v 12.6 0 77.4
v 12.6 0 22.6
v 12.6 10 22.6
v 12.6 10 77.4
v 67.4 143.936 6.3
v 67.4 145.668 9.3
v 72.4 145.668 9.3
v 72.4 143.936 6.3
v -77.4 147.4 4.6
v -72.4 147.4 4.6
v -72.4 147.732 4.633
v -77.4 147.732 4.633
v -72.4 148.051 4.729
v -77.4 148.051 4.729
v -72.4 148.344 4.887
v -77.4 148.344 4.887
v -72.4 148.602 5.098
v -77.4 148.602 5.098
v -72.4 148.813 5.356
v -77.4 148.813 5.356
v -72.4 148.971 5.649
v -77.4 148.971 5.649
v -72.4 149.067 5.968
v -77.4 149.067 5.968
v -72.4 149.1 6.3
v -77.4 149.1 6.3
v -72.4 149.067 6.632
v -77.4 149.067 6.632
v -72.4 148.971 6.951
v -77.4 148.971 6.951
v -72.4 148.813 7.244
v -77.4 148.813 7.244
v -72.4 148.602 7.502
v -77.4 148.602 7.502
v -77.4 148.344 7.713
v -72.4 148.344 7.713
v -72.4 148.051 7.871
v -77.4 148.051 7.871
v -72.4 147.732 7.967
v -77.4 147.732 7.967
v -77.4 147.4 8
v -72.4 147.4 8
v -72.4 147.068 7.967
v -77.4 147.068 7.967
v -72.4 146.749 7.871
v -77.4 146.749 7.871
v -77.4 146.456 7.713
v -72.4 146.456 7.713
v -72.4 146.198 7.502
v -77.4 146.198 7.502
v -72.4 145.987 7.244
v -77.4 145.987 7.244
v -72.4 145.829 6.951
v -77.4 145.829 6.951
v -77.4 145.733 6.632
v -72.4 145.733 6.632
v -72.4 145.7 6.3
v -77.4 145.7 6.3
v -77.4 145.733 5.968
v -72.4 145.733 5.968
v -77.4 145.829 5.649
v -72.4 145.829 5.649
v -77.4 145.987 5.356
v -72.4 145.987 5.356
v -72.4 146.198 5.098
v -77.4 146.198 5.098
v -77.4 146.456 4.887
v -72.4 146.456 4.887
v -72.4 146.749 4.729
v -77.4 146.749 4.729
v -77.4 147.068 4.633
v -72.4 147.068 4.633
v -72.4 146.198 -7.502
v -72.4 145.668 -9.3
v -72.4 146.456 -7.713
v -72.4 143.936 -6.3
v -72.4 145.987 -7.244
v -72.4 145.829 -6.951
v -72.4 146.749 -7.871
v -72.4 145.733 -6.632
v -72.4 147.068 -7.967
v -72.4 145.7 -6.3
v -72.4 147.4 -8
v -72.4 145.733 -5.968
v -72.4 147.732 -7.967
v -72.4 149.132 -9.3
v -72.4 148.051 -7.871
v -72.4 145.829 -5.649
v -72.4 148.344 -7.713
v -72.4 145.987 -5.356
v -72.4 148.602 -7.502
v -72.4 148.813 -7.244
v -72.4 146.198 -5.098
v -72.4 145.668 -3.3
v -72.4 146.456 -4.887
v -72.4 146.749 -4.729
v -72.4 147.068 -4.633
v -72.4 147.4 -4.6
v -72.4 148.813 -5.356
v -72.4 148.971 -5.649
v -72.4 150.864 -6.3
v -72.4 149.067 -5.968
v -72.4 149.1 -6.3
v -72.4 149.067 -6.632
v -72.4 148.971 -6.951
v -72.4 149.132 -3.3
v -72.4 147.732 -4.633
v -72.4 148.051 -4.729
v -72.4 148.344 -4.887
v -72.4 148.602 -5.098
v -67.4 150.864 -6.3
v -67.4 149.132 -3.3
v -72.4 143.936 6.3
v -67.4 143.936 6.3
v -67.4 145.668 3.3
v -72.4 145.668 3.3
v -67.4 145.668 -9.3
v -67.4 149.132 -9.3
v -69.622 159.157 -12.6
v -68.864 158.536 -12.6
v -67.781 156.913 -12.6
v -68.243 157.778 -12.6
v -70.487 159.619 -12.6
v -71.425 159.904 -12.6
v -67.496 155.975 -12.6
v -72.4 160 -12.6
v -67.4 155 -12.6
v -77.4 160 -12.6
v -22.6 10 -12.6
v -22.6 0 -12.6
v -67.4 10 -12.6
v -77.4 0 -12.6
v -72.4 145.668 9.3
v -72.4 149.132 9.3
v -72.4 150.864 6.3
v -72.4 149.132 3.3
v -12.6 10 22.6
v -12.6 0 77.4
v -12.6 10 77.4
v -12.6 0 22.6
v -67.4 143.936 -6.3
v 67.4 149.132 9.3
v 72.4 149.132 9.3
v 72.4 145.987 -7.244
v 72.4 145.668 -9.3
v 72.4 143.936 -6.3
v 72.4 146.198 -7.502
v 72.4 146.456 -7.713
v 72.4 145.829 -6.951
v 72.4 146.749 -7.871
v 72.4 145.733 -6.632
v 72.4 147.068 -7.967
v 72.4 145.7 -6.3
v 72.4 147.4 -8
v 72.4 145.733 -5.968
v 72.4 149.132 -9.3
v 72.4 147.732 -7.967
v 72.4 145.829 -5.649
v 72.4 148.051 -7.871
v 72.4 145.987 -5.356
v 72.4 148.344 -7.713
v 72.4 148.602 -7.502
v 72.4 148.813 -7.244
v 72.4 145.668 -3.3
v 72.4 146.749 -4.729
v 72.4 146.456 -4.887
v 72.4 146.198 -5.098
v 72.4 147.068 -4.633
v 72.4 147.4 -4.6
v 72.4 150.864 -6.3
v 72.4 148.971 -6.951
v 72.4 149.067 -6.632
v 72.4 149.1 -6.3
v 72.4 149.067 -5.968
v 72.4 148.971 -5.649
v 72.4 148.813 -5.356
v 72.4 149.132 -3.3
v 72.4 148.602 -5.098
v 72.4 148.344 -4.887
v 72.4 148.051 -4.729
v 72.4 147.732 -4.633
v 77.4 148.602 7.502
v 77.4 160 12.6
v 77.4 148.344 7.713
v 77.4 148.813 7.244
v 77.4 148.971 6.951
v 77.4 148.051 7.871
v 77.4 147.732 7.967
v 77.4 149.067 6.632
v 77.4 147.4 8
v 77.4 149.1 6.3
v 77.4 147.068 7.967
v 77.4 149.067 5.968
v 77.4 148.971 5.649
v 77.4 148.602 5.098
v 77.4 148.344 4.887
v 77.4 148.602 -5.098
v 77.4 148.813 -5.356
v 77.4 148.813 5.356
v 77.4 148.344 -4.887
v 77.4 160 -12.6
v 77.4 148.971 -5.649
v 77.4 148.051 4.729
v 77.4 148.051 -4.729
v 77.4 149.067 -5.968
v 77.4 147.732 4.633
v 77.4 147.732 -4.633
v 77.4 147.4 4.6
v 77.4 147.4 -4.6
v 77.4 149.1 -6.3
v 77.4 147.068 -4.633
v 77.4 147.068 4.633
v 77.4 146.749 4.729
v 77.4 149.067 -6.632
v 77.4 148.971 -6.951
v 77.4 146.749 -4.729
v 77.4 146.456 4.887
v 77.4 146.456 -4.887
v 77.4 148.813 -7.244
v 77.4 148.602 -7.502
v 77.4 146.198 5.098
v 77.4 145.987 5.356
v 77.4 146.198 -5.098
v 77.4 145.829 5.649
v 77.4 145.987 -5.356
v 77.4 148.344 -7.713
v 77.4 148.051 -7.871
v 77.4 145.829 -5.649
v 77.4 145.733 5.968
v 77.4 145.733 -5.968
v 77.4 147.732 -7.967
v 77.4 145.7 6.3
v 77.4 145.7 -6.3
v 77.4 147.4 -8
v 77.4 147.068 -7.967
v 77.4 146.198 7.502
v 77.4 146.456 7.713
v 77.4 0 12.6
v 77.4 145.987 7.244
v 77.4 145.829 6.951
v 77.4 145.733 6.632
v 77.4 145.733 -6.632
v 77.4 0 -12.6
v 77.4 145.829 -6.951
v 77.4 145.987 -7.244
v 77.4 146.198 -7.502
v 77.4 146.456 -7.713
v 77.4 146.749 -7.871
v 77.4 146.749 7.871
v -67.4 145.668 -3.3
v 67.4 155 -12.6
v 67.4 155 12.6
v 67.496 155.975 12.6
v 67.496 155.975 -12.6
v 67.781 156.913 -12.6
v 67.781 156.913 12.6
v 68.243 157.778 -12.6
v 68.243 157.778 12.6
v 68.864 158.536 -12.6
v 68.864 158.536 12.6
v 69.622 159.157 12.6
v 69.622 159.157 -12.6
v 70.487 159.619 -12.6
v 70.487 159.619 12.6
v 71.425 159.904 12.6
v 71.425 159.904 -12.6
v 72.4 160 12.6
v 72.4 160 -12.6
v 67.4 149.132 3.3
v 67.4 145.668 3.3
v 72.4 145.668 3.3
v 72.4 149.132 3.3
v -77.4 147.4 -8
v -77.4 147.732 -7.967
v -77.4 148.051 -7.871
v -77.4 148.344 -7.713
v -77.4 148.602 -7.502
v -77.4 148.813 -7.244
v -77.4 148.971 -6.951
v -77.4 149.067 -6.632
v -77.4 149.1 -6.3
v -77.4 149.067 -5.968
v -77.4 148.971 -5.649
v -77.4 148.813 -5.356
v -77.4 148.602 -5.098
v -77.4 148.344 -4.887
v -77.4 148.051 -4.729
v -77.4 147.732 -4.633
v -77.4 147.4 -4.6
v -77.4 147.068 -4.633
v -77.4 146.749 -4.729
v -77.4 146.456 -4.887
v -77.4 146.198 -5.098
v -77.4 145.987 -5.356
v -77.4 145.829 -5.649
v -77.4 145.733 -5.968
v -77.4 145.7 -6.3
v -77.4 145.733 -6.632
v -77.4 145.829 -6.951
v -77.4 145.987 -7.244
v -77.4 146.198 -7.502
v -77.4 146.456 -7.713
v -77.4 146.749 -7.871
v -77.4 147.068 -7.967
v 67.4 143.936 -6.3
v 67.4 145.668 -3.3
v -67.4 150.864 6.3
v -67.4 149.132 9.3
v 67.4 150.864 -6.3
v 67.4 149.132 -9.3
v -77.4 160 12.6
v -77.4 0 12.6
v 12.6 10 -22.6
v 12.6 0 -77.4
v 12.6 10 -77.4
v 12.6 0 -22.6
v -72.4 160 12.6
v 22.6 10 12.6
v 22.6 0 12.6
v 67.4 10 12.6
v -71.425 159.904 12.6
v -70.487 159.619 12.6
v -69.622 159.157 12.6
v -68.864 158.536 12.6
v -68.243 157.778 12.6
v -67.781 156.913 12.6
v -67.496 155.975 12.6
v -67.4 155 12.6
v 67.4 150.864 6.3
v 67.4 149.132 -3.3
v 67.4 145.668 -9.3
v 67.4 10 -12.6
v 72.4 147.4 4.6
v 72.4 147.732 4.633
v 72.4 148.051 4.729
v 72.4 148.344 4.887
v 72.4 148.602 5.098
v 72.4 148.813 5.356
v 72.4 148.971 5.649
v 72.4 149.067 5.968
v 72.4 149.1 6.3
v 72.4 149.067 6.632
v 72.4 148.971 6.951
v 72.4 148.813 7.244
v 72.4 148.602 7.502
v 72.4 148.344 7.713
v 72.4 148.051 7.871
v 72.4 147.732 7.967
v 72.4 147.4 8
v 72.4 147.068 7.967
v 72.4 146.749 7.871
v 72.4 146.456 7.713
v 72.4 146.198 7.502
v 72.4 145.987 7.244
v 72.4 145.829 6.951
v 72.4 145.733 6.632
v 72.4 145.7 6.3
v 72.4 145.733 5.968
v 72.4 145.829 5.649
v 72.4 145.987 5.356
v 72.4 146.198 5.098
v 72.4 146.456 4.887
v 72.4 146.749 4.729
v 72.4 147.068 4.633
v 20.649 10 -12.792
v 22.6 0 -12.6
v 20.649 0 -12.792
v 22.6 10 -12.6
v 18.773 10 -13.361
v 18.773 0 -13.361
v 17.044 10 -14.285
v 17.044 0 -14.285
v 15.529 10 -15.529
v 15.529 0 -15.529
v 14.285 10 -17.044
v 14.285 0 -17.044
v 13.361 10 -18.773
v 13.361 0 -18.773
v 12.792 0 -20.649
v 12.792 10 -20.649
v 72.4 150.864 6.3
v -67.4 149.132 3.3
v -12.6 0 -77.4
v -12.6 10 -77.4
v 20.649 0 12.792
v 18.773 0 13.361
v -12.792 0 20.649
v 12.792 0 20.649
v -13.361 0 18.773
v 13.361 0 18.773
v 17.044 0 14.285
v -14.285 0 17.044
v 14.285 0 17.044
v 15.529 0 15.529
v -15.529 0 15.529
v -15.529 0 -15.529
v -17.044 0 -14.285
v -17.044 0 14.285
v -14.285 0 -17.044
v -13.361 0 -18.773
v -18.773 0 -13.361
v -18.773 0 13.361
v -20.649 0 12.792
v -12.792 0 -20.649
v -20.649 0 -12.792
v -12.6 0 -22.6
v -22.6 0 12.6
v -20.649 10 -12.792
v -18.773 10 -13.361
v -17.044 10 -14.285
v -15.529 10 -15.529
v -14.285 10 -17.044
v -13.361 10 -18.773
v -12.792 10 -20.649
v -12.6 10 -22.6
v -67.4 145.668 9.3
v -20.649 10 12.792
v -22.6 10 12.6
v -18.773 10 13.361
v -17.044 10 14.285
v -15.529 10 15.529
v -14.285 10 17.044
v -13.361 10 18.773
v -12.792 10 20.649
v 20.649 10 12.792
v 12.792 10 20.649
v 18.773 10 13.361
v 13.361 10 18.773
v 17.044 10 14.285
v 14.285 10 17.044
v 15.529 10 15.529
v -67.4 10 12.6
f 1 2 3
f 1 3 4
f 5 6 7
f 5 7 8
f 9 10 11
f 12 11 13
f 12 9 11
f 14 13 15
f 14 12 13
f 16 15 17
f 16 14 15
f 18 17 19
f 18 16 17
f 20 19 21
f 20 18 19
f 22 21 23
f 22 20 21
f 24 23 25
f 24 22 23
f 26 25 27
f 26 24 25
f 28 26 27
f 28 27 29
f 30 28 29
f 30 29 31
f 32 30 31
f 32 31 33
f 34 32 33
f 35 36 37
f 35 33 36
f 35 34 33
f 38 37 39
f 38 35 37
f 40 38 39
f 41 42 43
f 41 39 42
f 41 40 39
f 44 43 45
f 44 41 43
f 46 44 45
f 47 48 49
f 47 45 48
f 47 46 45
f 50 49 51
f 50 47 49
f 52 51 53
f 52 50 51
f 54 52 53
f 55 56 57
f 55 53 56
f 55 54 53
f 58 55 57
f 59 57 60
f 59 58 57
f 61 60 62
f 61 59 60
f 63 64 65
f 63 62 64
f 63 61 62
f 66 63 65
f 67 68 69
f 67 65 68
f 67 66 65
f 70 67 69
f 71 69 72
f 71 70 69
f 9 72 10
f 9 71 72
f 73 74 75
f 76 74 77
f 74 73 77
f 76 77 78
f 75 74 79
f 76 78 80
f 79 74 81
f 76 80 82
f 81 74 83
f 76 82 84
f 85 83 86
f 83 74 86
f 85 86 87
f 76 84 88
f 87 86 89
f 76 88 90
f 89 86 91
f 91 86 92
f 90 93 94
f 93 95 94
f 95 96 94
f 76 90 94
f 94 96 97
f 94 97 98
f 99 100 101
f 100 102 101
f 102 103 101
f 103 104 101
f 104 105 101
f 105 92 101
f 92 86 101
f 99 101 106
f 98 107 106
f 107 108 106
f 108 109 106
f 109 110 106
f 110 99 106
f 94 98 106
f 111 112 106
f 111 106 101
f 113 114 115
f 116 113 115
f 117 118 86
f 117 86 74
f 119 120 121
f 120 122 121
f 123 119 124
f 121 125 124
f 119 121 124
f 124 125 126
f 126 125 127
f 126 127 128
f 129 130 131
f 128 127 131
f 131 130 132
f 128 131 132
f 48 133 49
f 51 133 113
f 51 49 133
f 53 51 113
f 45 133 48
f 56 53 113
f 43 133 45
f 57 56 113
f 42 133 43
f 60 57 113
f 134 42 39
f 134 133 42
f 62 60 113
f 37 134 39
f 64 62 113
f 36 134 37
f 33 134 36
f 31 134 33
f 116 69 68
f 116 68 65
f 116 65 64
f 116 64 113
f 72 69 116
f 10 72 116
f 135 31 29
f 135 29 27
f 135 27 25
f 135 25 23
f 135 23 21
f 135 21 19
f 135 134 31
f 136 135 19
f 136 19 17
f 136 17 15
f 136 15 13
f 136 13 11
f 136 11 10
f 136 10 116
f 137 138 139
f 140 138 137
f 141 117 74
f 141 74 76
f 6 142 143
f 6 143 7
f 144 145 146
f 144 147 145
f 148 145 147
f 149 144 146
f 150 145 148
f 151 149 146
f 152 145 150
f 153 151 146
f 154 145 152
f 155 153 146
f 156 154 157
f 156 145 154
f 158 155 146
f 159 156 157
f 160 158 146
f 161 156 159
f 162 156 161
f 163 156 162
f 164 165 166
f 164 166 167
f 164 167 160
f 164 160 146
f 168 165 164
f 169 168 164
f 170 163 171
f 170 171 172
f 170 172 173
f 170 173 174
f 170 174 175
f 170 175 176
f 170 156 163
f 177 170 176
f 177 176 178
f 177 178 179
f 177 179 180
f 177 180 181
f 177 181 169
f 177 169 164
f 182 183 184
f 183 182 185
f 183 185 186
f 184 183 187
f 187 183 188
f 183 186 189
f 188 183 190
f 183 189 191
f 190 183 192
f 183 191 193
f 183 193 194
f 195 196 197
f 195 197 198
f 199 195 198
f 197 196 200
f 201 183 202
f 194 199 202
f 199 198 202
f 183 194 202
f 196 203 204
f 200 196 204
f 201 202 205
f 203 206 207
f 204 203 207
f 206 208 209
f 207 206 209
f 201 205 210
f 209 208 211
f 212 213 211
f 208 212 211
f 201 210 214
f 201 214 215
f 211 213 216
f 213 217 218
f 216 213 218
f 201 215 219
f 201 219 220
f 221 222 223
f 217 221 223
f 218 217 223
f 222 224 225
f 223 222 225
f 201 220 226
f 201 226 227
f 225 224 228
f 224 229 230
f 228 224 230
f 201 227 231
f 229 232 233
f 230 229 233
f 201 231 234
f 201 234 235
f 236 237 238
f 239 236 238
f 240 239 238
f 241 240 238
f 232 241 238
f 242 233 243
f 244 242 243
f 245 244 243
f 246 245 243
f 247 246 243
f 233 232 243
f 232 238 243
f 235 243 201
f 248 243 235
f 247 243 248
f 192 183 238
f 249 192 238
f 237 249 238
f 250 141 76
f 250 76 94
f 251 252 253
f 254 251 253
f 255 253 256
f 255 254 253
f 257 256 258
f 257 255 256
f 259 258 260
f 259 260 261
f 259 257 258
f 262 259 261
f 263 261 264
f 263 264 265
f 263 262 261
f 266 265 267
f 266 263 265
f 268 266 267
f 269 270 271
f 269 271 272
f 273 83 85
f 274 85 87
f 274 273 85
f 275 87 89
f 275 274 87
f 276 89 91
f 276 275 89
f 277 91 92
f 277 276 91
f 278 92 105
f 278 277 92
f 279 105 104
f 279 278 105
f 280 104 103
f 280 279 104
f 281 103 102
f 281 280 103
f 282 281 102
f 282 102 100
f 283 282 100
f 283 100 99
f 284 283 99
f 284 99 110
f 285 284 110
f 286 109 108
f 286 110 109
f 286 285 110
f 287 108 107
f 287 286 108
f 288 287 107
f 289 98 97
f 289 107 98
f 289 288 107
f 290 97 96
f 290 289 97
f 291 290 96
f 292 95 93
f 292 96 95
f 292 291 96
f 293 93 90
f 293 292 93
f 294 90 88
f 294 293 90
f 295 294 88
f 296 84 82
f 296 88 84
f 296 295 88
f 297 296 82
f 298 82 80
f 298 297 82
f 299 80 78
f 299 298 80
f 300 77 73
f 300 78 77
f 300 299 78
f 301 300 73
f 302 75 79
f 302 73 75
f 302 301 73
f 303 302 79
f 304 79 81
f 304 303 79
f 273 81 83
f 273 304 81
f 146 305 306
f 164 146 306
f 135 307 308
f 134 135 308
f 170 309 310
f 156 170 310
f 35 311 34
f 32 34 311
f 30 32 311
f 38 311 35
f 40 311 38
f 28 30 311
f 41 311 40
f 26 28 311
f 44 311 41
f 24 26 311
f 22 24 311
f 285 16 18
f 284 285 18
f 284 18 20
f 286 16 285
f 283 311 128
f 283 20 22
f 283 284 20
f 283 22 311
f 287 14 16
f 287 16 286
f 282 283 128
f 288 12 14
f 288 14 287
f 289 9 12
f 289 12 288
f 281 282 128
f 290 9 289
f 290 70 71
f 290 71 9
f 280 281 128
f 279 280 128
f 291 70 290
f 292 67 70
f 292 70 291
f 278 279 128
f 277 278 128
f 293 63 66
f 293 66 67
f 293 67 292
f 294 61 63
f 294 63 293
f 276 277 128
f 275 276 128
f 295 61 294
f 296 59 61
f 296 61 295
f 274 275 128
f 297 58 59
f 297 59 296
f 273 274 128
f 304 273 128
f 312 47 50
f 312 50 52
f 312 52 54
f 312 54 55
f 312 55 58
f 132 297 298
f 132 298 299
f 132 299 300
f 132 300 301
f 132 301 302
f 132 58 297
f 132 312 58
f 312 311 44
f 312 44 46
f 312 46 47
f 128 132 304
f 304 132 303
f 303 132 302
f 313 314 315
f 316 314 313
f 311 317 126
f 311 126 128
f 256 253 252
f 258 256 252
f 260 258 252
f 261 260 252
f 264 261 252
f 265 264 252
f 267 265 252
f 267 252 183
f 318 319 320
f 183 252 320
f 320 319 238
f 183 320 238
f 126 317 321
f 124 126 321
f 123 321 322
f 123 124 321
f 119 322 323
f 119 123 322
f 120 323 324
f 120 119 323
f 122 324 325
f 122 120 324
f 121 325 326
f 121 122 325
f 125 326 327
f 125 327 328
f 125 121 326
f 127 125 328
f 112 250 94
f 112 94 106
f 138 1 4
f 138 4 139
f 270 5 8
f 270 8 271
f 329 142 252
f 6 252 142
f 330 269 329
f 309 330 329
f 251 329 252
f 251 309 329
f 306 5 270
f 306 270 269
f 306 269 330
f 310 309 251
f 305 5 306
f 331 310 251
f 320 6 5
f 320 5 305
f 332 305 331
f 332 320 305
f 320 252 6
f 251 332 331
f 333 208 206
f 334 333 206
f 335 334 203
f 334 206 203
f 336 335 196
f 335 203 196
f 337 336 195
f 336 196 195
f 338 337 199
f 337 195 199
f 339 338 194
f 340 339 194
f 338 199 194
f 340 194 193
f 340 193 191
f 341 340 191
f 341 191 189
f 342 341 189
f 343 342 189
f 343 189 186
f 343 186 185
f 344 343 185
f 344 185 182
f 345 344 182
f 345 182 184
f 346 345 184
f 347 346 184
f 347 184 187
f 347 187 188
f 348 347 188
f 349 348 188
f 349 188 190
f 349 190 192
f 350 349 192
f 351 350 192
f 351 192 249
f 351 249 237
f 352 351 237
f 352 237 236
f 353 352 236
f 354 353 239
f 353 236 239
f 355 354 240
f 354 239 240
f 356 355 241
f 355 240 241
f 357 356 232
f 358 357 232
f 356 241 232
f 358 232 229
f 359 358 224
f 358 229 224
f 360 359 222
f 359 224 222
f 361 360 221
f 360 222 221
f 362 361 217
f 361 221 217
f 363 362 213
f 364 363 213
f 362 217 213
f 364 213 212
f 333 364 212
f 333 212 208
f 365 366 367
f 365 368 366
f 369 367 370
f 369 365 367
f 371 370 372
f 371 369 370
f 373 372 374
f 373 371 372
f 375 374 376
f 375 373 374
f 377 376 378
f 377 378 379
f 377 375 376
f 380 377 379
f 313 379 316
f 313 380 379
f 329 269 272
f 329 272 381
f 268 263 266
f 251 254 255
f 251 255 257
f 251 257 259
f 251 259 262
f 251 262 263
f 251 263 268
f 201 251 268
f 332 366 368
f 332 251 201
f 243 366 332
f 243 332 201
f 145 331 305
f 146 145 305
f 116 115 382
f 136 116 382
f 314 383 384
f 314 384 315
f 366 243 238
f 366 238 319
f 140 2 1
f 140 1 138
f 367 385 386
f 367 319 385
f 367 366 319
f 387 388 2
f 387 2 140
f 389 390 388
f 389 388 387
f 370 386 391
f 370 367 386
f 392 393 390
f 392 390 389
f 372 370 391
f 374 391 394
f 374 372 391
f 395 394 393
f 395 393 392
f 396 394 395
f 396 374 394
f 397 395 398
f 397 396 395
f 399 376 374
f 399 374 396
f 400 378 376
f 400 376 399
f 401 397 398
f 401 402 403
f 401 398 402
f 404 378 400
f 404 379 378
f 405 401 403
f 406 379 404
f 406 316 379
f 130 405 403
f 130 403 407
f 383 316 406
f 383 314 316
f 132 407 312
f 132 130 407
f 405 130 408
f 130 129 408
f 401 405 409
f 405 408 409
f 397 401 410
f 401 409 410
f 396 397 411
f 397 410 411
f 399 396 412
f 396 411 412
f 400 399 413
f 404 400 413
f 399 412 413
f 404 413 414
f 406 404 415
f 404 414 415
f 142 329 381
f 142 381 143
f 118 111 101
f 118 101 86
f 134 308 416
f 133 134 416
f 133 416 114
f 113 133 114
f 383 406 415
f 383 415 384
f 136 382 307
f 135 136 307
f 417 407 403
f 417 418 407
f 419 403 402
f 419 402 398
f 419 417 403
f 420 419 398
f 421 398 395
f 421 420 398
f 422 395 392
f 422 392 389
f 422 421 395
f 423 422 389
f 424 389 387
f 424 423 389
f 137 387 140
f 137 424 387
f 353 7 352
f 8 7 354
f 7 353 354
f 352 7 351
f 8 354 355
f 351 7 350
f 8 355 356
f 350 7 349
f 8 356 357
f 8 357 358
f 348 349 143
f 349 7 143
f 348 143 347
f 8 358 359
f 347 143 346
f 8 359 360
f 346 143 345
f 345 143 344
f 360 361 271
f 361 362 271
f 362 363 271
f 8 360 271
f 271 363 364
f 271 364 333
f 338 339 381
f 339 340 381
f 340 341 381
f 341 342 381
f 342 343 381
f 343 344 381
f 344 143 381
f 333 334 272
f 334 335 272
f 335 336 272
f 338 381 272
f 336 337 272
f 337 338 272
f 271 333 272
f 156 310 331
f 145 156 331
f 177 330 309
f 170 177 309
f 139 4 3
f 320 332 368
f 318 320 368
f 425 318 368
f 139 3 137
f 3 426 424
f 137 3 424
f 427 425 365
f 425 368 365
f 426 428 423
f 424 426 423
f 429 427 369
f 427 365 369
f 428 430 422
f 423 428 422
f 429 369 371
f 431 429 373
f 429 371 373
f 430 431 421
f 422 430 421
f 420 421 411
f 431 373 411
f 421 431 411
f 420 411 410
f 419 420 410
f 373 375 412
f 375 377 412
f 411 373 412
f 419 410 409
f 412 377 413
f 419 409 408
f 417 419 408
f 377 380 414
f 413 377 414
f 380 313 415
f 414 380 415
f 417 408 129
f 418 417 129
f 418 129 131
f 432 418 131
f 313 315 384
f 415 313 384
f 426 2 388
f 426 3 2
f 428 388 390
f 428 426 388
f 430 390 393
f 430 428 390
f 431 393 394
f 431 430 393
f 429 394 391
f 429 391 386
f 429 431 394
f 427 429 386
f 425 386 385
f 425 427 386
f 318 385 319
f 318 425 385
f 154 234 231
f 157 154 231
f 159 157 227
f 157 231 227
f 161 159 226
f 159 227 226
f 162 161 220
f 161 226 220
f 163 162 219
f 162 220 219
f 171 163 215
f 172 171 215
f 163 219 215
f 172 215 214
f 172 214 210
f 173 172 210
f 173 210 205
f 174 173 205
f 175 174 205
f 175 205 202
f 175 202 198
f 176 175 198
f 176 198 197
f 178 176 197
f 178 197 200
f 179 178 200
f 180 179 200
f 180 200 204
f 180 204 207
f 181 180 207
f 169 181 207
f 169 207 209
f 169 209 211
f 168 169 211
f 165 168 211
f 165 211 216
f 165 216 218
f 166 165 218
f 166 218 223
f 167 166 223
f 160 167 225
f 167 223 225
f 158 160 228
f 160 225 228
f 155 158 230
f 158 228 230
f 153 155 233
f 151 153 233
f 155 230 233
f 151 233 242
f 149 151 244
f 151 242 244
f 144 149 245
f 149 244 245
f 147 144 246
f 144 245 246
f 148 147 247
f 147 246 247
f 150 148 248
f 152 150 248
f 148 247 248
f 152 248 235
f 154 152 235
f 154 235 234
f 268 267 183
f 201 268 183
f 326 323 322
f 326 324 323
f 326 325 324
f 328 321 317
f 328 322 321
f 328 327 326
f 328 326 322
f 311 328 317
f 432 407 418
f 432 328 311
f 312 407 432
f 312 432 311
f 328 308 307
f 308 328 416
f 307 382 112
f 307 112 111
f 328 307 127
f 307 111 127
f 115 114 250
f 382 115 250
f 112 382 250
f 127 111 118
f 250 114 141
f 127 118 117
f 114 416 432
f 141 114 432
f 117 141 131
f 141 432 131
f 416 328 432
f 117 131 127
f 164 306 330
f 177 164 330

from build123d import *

# Parameters (mm, degrees)
BOSS_EXTRUDE1_DEPTH = 10
SKETCH2_W           = 10
SKETCH2_H           = 25.2
BOSS_EXTRUDE2_DEPTH = 150
SKETCH3_R           = 1.7
CUT_EXTRUDE1_DEPTH  = 236.69853627
CUT_EXTRUDE2_DEPTH  = 5
FILLET1_R           = 10
FILLET2_R           = 5


with BuildPart() as part:
    # Sketch1 → Boss-Extrude1 (new body)
    with BuildSketch(Plane(origin=(0, 0, 0), x_dir=(1, 0, 0), z_dir=(0, 1, 0))):
        Polygon((12.6, 12.6), (77.4, 12.6), (77.4, -12.6), (12.6, -12.6), (12.6, -77.4), (-12.6, -77.4), (-12.6, -12.6), (-77.4, -12.6), (-77.4, 12.6), (-12.6, 12.6), (-12.6, 77.4), (12.6, 77.4), align=None)
    extrude(amount=BOSS_EXTRUDE1_DEPTH)

    # Sketch2 → Boss-Extrude2 (add)
    with BuildSketch(Plane(origin=(0, 10, 0), x_dir=(1, 0, 0), z_dir=(0, 1, 0))):
        with Locations((72.4, 0)):
            Rectangle(SKETCH2_W, SKETCH2_H)
    boss_extrude2 = extrude(amount=BOSS_EXTRUDE2_DEPTH)

    # Sketch3 → Cut-Extrude1 (cut, through all)
    with BuildSketch(Plane(origin=(77.4, 0, 0), x_dir=(0, 0, -1), z_dir=(1, 0, 0))):
        with Locations((-6.3, 147.4)):
            Circle(SKETCH3_R)
        with Locations((6.3, 147.4)):
            Circle(SKETCH3_R)
    cut_extrude1 = extrude(amount=-CUT_EXTRUDE1_DEPTH, mode=Mode.SUBTRACT)

    # Sketch4 → Cut-Extrude2 (cut)
    with BuildSketch(Plane.ZY.offset(-67.4)):
        Polygon((-6.3, 143.935898385), (-3.3, 145.667949192), (-3.3, 149.132050808), (-6.3, 150.864101615), (-9.3, 149.132050808), (-9.3, 145.667949192), align=None)
        Polygon((9.3, 145.667949192), (6.3, 143.935898385), (3.3, 145.667949192), (3.3, 149.132050808), (6.3, 150.864101615), (9.3, 149.132050808), align=None)
    cut_extrude2 = extrude(amount=-CUT_EXTRUDE2_DEPTH, mode=Mode.SUBTRACT)

    # Mirror1: Boss-Extrude2, Cut-Extrude1, Cut-Extrude2 across plane
    add(boss_extrude2.mirror(Plane(origin=(0, 0, 0), x_dir=(0, 0, 1), z_dir=(1, 0, 0))))
    add(cut_extrude1.mirror(Plane(origin=(0, 0, 0), x_dir=(0, 0, 1), z_dir=(1, 0, 0))), mode=Mode.SUBTRACT)
    add(cut_extrude2.mirror(Plane(origin=(0, 0, 0), x_dir=(0, 0, 1), z_dir=(1, 0, 0))), mode=Mode.SUBTRACT)

    # Fillet1
    fillet1_edges = [part.edges().sort_by_distance(p)[0] for p in [
        (12.6, 5, 12.6),
        (-12.6, 5, 12.6),
        (-12.6, 5, -12.6),
        (12.6, 5, -12.6),
    ]]
    fillet(fillet1_edges, radius=FILLET1_R)

    # Fillet2
    fillet2_edges = [part.edges().sort_by_distance(p)[0] for p in [
        (67.4, 160, 0),
        (-67.4, 160, 0),
    ]]
    fillet(fillet2_edges, radius=FILLET2_R)


solid = part.part
